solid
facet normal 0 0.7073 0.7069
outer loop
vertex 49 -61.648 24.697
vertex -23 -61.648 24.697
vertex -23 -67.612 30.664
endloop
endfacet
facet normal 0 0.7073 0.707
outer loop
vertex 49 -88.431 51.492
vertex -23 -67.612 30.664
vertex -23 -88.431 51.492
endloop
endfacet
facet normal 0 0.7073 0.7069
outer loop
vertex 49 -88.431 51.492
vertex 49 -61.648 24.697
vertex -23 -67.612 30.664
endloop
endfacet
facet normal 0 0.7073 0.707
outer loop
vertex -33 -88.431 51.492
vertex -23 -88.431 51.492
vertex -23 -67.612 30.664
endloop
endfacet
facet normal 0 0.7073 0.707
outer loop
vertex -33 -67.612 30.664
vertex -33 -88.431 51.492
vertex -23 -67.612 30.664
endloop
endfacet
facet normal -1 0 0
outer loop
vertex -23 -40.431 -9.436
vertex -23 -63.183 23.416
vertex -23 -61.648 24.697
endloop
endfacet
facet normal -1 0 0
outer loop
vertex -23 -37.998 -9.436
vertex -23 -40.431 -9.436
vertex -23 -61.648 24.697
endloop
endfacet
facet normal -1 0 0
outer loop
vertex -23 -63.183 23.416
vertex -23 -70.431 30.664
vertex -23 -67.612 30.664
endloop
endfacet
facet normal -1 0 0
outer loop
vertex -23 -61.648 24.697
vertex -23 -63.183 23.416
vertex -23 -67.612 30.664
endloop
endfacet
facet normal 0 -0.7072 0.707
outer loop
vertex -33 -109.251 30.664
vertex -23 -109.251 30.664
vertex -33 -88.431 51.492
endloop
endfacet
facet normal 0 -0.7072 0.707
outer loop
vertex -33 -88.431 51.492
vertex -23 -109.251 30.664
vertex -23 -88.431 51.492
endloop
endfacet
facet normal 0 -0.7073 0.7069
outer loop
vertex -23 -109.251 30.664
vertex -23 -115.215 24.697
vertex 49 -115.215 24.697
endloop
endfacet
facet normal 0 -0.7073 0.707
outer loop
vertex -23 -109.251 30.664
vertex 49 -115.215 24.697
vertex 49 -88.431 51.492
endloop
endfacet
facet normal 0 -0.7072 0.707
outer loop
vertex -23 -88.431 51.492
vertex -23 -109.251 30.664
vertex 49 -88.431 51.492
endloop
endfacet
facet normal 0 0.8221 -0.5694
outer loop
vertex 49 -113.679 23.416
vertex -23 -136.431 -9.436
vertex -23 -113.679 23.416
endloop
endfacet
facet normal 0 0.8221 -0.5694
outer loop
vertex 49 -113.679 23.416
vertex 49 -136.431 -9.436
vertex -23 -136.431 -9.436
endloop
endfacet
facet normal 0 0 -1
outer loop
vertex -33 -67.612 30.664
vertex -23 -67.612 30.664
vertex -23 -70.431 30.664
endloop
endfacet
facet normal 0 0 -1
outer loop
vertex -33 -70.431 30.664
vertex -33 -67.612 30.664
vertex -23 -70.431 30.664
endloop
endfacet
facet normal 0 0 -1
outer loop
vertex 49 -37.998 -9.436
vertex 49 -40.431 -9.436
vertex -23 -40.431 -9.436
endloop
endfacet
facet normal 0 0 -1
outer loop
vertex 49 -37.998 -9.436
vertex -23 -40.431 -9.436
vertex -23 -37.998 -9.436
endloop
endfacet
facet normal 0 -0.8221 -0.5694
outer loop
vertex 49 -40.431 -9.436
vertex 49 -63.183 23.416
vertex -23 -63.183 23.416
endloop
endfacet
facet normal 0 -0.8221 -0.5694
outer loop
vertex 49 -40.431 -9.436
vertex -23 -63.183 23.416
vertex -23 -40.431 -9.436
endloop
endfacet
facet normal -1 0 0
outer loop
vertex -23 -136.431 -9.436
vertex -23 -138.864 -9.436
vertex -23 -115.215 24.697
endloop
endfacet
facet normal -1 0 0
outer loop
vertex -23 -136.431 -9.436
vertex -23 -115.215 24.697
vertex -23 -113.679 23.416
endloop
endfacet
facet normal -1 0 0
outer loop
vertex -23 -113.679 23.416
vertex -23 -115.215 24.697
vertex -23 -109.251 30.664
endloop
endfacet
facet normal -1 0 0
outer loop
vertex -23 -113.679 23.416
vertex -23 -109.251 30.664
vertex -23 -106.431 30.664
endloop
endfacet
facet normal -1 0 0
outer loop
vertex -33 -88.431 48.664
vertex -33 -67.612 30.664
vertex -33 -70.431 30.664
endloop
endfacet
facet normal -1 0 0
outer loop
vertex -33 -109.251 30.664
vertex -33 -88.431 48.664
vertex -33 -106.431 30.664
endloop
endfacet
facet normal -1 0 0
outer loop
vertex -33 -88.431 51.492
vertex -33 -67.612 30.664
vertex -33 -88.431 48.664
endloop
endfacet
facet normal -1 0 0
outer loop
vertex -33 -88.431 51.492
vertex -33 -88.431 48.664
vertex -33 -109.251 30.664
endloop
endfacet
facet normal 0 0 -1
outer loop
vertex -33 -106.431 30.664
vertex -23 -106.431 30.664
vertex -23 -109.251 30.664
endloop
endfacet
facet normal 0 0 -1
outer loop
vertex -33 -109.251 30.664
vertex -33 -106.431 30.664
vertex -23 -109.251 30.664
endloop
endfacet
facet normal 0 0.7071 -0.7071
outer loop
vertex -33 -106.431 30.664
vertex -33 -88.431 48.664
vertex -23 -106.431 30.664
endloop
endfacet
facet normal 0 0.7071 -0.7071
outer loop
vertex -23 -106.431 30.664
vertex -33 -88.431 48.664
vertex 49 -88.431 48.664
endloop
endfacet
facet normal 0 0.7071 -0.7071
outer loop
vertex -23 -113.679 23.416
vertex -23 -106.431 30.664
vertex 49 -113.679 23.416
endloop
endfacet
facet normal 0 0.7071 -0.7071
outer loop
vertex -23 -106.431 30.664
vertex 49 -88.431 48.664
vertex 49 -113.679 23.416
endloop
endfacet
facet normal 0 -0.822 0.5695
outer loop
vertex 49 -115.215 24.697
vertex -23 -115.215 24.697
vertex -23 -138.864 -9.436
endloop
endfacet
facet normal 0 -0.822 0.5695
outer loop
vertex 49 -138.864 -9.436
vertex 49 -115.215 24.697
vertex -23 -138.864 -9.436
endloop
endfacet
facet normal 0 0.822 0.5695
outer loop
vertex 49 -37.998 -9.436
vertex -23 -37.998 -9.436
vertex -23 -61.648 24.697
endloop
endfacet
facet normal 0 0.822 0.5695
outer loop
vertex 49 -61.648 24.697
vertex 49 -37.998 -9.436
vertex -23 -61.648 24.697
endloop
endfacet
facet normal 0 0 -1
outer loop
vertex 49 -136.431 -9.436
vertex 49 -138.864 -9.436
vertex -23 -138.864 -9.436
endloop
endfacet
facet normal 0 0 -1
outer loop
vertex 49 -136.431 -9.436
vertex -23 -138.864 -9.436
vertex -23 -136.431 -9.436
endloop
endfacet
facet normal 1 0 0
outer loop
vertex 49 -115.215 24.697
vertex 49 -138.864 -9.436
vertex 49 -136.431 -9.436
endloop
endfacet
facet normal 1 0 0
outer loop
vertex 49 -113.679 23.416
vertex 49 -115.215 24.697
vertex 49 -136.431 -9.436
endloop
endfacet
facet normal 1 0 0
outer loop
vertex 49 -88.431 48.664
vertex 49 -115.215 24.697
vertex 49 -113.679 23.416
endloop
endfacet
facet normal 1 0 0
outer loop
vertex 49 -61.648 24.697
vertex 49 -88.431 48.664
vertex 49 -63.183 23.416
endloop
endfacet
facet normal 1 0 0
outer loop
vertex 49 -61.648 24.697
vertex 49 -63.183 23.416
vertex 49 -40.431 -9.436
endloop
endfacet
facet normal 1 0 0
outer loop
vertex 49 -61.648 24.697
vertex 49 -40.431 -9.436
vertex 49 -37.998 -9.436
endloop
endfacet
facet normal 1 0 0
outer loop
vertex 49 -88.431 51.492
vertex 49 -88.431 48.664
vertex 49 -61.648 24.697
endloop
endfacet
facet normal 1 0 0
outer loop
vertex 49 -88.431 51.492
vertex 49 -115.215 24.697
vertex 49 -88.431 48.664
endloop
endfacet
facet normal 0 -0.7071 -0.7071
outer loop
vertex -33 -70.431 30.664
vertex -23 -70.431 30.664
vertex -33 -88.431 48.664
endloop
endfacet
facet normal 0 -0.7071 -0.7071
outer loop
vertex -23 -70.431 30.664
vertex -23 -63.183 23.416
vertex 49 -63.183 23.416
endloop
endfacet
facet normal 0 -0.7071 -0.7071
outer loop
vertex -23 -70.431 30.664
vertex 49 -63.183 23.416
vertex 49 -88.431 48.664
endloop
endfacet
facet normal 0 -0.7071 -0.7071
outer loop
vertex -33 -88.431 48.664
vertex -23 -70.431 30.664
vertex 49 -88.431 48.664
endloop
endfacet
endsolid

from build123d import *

# Parameters (mm, degrees)
F1_DEPTH = 51
F2_DEPTH = 2
F3_DEPTH = 23
F5_DEPTH = 10


with BuildPart() as f1:
    # F0 (on Right) → F1 (new body)
    with BuildSketch(Plane.YZ):
        Polygon((-106.4311944246, 30.6635548347), (-88.4311944246, 48.6635548347), (-70.4311944246, 30.6635548347), (-63.1831944246, 23.4155548347), (-40.4311944246, -9.4364451653), (-37.9983836671, -9.4364451653), (-61.6478004918, 24.697180939), (-88.4311944246, 51.4919819594), (-115.2145883574, 24.697180939), (-138.8640051821, -9.4364451653), (-136.4311944246, -9.4364451653), (-113.6791944246, 23.4155548347), align=None)
    extrude(amount=F1_DEPTH)

    # F2 (cut): a face of the model
    f2_faces = [f1.faces().sort_by_distance(p)[0] for p in [
        (51, -100.9894629386, 37.2615078041),
    ]]
    extrude(f2_faces, amount=-F2_DEPTH, mode=Mode.SUBTRACT)

    # F3 (add): a face of the model
    f3_faces = [f1.faces().sort_by_distance(p)[0] for p in [
        (0, -100.9894629386, 37.2615078041),
    ]]
    extrude(f3_faces, amount=F3_DEPTH)

    # F4 (on face) → F5 (join)
    with BuildSketch(Plane(origin=(-23, 0, 0), x_dir=(0, -1, 0), z_dir=(-1, 0, 0))):
        Polygon((88.4311944246, 51.4919819594), (67.6116343818, 30.6635548347), (70.4311944246, 30.6635548347), (88.4311944246, 48.6635548347), (106.4311944246, 30.6635548347), (109.2507544675, 30.6635548347), align=None)
    extrude(amount=F5_DEPTH)


solid = f1.part
